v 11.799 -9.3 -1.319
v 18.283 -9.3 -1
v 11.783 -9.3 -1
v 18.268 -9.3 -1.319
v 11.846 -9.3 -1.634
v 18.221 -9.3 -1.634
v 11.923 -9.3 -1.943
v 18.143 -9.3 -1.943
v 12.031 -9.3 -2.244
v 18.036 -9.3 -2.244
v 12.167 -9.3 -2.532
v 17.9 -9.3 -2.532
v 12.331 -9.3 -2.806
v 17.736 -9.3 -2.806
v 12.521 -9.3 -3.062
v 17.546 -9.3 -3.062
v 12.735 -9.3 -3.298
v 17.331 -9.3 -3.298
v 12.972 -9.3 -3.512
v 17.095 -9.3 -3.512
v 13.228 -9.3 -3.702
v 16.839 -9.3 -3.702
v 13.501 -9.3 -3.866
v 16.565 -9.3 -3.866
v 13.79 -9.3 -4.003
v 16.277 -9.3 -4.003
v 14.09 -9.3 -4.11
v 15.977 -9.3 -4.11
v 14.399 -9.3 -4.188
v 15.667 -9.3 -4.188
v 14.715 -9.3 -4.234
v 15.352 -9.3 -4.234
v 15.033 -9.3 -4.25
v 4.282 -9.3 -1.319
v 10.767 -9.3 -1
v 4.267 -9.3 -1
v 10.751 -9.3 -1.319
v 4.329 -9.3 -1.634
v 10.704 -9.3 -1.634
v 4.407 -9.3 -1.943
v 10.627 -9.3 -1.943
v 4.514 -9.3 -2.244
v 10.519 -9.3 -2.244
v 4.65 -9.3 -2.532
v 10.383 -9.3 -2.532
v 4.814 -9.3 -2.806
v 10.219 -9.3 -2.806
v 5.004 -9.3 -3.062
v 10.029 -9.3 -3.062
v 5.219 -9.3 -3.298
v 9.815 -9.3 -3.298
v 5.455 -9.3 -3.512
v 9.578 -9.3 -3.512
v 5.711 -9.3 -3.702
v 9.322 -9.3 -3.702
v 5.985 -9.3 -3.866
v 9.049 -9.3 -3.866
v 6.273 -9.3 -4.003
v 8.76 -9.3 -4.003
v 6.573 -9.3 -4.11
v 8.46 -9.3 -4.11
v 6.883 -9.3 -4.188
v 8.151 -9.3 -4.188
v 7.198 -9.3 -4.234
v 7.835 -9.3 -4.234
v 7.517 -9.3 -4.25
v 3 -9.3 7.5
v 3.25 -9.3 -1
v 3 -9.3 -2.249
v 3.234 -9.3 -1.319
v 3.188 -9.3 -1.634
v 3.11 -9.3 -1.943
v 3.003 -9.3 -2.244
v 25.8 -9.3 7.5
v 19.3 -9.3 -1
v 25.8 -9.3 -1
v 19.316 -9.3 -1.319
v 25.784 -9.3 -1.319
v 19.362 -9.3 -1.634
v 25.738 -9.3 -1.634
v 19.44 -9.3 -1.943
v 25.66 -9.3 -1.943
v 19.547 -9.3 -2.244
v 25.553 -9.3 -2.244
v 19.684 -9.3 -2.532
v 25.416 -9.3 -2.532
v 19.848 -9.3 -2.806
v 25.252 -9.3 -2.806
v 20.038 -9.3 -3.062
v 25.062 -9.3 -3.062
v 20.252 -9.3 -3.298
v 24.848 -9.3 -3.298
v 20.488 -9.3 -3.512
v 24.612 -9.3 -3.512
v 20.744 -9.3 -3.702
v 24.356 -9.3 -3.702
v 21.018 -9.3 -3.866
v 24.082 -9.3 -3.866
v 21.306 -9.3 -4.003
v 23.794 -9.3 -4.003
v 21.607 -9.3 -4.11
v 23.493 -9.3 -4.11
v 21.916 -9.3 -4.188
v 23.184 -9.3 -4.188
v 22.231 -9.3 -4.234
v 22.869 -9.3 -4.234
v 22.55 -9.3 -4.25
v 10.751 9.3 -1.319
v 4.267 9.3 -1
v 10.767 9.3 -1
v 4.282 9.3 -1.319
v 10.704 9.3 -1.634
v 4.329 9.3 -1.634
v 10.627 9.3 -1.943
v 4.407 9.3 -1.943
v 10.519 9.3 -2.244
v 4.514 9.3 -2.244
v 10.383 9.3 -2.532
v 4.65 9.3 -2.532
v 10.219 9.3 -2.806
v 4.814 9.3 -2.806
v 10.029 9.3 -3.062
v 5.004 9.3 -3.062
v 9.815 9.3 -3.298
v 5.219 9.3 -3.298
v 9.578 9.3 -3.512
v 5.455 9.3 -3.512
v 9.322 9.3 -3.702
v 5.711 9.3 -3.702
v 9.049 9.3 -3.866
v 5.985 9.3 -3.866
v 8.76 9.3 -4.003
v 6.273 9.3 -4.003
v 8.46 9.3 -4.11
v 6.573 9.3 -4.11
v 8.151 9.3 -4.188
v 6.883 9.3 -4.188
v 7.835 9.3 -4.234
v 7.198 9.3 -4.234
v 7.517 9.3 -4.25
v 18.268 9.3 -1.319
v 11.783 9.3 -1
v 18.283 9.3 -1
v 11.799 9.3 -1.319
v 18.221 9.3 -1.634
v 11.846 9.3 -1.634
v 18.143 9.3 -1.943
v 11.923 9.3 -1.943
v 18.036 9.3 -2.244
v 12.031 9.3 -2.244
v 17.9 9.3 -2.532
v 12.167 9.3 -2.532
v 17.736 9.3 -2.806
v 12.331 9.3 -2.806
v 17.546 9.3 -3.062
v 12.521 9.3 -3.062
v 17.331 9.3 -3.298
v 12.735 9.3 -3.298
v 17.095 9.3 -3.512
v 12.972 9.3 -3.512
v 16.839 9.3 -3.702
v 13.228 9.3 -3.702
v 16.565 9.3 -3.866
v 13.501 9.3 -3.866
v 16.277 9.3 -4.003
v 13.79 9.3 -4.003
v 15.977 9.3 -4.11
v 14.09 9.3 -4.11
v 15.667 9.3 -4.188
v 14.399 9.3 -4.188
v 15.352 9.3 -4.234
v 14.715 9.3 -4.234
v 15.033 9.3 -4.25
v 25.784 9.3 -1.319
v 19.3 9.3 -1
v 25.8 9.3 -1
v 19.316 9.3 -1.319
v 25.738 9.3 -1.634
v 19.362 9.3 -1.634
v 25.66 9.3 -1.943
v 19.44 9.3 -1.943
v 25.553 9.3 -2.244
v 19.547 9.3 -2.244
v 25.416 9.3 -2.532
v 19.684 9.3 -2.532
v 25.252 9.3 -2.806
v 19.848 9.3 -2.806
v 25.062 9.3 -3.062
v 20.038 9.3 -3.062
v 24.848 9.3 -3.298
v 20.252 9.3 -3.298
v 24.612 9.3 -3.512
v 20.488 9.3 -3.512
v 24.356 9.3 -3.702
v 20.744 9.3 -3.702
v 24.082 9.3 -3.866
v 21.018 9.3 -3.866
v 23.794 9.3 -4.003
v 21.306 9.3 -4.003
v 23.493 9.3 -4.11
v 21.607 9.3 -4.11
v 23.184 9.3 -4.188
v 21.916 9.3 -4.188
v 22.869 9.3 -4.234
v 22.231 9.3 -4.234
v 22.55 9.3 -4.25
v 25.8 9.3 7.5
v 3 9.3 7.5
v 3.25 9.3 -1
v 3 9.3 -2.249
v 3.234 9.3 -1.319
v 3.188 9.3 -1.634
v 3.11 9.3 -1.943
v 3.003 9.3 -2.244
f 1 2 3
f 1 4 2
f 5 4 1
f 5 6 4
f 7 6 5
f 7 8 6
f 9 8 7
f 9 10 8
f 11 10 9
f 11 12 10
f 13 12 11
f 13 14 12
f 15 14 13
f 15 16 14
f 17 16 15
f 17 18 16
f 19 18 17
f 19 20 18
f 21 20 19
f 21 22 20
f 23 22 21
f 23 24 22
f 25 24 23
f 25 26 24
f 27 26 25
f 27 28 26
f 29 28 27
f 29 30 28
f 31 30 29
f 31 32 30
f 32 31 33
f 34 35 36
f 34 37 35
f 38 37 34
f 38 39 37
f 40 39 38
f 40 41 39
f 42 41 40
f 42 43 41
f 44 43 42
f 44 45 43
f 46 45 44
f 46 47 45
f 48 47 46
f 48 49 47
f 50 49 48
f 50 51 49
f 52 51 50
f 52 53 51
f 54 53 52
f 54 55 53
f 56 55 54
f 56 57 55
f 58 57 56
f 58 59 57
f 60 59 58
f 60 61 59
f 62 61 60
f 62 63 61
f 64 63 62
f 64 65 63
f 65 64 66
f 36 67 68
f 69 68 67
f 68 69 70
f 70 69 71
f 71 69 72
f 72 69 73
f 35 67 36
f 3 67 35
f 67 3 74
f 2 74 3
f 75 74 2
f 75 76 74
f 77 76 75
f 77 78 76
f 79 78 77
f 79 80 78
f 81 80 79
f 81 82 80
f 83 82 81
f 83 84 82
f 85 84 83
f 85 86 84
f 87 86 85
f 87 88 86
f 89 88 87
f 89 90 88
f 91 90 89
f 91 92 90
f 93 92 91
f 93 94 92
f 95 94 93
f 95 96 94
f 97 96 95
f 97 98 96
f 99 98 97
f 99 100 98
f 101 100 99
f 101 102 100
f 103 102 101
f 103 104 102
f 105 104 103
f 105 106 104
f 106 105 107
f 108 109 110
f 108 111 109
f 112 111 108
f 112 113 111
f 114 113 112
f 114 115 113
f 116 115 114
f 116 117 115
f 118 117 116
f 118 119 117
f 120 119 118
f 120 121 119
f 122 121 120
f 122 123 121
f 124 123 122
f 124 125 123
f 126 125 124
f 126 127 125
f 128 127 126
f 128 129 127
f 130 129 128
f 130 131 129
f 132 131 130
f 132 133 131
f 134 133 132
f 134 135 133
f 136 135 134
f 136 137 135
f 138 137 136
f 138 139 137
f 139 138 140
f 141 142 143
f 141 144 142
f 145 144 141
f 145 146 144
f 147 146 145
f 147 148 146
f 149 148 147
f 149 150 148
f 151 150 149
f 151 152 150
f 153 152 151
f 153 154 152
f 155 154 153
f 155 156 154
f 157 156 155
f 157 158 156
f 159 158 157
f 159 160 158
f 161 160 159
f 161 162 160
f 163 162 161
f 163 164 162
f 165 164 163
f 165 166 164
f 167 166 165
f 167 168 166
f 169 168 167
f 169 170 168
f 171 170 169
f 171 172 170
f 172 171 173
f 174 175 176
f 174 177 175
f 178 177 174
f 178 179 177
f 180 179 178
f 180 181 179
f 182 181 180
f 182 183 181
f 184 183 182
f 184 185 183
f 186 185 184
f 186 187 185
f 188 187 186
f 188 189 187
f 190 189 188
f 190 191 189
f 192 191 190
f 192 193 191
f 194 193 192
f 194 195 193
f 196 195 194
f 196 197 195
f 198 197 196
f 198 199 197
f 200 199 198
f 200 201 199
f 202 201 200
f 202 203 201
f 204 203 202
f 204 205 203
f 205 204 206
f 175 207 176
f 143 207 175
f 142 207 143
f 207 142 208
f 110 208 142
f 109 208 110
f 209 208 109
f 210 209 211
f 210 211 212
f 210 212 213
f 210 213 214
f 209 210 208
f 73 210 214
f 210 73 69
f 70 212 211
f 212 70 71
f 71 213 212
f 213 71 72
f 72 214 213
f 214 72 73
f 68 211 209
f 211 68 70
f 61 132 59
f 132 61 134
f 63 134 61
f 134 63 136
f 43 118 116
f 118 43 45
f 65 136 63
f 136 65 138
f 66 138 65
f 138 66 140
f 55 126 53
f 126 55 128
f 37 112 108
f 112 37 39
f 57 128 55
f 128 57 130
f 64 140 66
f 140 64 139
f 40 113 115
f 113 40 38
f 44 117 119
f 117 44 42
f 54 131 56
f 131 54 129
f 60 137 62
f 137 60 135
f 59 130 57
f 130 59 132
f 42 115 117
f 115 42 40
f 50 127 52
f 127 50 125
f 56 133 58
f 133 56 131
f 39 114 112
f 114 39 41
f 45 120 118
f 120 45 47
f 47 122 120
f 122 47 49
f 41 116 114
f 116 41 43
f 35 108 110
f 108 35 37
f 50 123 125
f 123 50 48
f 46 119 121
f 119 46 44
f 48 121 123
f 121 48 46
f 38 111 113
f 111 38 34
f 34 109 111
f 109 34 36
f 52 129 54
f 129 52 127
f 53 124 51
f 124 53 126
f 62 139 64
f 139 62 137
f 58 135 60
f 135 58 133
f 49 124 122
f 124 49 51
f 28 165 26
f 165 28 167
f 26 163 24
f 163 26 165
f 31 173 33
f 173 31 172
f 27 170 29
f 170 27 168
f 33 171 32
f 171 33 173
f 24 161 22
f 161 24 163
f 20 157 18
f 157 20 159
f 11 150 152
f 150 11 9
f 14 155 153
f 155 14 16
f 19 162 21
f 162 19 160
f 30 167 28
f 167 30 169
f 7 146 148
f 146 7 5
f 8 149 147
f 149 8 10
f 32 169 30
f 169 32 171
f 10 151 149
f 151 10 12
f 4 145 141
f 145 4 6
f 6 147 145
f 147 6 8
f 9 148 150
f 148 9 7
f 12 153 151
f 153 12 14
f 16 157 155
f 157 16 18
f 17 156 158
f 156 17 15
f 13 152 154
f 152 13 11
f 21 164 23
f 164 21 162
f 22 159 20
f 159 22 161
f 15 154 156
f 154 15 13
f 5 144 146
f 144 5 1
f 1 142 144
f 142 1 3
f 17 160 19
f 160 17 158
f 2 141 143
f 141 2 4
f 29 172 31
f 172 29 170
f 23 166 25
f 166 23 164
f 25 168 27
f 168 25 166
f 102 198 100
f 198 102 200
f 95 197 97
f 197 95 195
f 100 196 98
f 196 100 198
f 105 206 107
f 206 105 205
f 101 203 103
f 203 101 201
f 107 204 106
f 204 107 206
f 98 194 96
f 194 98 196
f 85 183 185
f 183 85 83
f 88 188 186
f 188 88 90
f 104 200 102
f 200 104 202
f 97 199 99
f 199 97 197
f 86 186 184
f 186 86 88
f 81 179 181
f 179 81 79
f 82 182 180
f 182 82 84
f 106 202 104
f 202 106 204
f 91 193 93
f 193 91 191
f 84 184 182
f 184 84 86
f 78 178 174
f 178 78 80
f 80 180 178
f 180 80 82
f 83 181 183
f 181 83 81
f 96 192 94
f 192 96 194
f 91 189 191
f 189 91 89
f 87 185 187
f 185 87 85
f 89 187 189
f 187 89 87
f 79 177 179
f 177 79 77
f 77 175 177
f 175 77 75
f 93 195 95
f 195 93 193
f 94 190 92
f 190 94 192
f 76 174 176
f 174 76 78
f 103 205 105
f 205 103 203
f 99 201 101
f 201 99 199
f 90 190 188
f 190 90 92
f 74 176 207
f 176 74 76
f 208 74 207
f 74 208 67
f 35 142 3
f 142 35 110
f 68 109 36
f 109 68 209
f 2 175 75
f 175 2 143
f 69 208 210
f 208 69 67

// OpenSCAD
// file: kneeler-boot-config.scad
leg_l = 51.5;
leg_w = 18.5;

//Performance Settings
preview = false; //set preview=true for faster rendering with lower detail, or false for full detail.
crosssection_view = true; // Set to true to cut the model along a plane and show only one side
crosssection_axis = "x"; // axis: 'x', 'y', or 'z'
crosssection_pos = 3; // position (mm) along the chosen axis where the cut occurs (default 0 = origin)
// main file
include <kneeler-boot-config.scad>

// --- TEKTONOLOGY KNEELER BOOT FOOT: 7-RIB INSERT --- // This is the internal TPU insert that slips into the bottom half of the coupler. It has a main rectangular body with 7 evenly spaced semi-cylindrical ribs on the bottom to create a secure, high-friction fit within the socket. The dimensions are designed to be slightly larger than the socket for a tight fit, and the ribs provide additional grip and stability when kneeling. 
socket_depth = 6.5; //depth of the socket to slip into
core_protrusion = 2; //core extension beyond the socket

tightness = 0.1; // Adjust this: 0.0 for snug, 0.2 for very tight
$fn = preview ?  32 : 64;

ribs = 7; 
radius = socket_depth / 2; // Radius of semi-cylinders

module main() {
    core_depth = socket_depth + core_protrusion; //thickness of main body
    insert_l = leg_l + tightness;
    insert_w = leg_w + tightness;
    
    
    // This calculates rib width so the total set fits exactly
    rib_w = (insert_l - ((ribs - 1))) / ribs; 
    pitch = (insert_l - (2 * radius)) / (ribs - 1);

    union() {
        // THE MAIN BODY (The "Core")
        translate([0, 0, socket_depth/2])
            cube([insert_l, insert_w, core_depth], center=true);
        

        //SEMI-CYLINDERS
        for (i = [0 : ribs - 1]) {
            // Start at the left edge + radius, then move by pitch
            x_pos = (i * pitch) - (insert_l/2) + radius;
            
            //center cylinder at edge of core
            z_axis = -1 * (core_protrusion / 2);

            translate([x_pos, 0, z_axis])
                rotate([90, 0, 0]) 
                    cylinder(h = insert_w, r = radius, center = true); 
        }

        

    }
}

// Optionally render a cross-section (half) view so you can inspect internals
if (!crosssection_view) {
    main();
} else {
    // Intersect the model with a very large half-space cube to show only one side
    intersection() {
        main();
        half_space = leg_l; // large extent to fully cover the model
        // keep the positive side of the chosen axis starting at crosssection_pos
        if (crosssection_axis == "x")
            translate([crosssection_pos, -half_space, -half_space])
                cube([half_space*2, half_space*2, half_space*2]);
        if (crosssection_axis == "y")
            translate([-half_space, crosssection_pos, -half_space])
                cube([half_space*2, half_space*2, half_space*2]);
        if (crosssection_axis == "z")
            translate([-half_space, -half_space, crosssection_pos])
                cube([half_space*2, half_space*2, half_space*2]);
    }
}
